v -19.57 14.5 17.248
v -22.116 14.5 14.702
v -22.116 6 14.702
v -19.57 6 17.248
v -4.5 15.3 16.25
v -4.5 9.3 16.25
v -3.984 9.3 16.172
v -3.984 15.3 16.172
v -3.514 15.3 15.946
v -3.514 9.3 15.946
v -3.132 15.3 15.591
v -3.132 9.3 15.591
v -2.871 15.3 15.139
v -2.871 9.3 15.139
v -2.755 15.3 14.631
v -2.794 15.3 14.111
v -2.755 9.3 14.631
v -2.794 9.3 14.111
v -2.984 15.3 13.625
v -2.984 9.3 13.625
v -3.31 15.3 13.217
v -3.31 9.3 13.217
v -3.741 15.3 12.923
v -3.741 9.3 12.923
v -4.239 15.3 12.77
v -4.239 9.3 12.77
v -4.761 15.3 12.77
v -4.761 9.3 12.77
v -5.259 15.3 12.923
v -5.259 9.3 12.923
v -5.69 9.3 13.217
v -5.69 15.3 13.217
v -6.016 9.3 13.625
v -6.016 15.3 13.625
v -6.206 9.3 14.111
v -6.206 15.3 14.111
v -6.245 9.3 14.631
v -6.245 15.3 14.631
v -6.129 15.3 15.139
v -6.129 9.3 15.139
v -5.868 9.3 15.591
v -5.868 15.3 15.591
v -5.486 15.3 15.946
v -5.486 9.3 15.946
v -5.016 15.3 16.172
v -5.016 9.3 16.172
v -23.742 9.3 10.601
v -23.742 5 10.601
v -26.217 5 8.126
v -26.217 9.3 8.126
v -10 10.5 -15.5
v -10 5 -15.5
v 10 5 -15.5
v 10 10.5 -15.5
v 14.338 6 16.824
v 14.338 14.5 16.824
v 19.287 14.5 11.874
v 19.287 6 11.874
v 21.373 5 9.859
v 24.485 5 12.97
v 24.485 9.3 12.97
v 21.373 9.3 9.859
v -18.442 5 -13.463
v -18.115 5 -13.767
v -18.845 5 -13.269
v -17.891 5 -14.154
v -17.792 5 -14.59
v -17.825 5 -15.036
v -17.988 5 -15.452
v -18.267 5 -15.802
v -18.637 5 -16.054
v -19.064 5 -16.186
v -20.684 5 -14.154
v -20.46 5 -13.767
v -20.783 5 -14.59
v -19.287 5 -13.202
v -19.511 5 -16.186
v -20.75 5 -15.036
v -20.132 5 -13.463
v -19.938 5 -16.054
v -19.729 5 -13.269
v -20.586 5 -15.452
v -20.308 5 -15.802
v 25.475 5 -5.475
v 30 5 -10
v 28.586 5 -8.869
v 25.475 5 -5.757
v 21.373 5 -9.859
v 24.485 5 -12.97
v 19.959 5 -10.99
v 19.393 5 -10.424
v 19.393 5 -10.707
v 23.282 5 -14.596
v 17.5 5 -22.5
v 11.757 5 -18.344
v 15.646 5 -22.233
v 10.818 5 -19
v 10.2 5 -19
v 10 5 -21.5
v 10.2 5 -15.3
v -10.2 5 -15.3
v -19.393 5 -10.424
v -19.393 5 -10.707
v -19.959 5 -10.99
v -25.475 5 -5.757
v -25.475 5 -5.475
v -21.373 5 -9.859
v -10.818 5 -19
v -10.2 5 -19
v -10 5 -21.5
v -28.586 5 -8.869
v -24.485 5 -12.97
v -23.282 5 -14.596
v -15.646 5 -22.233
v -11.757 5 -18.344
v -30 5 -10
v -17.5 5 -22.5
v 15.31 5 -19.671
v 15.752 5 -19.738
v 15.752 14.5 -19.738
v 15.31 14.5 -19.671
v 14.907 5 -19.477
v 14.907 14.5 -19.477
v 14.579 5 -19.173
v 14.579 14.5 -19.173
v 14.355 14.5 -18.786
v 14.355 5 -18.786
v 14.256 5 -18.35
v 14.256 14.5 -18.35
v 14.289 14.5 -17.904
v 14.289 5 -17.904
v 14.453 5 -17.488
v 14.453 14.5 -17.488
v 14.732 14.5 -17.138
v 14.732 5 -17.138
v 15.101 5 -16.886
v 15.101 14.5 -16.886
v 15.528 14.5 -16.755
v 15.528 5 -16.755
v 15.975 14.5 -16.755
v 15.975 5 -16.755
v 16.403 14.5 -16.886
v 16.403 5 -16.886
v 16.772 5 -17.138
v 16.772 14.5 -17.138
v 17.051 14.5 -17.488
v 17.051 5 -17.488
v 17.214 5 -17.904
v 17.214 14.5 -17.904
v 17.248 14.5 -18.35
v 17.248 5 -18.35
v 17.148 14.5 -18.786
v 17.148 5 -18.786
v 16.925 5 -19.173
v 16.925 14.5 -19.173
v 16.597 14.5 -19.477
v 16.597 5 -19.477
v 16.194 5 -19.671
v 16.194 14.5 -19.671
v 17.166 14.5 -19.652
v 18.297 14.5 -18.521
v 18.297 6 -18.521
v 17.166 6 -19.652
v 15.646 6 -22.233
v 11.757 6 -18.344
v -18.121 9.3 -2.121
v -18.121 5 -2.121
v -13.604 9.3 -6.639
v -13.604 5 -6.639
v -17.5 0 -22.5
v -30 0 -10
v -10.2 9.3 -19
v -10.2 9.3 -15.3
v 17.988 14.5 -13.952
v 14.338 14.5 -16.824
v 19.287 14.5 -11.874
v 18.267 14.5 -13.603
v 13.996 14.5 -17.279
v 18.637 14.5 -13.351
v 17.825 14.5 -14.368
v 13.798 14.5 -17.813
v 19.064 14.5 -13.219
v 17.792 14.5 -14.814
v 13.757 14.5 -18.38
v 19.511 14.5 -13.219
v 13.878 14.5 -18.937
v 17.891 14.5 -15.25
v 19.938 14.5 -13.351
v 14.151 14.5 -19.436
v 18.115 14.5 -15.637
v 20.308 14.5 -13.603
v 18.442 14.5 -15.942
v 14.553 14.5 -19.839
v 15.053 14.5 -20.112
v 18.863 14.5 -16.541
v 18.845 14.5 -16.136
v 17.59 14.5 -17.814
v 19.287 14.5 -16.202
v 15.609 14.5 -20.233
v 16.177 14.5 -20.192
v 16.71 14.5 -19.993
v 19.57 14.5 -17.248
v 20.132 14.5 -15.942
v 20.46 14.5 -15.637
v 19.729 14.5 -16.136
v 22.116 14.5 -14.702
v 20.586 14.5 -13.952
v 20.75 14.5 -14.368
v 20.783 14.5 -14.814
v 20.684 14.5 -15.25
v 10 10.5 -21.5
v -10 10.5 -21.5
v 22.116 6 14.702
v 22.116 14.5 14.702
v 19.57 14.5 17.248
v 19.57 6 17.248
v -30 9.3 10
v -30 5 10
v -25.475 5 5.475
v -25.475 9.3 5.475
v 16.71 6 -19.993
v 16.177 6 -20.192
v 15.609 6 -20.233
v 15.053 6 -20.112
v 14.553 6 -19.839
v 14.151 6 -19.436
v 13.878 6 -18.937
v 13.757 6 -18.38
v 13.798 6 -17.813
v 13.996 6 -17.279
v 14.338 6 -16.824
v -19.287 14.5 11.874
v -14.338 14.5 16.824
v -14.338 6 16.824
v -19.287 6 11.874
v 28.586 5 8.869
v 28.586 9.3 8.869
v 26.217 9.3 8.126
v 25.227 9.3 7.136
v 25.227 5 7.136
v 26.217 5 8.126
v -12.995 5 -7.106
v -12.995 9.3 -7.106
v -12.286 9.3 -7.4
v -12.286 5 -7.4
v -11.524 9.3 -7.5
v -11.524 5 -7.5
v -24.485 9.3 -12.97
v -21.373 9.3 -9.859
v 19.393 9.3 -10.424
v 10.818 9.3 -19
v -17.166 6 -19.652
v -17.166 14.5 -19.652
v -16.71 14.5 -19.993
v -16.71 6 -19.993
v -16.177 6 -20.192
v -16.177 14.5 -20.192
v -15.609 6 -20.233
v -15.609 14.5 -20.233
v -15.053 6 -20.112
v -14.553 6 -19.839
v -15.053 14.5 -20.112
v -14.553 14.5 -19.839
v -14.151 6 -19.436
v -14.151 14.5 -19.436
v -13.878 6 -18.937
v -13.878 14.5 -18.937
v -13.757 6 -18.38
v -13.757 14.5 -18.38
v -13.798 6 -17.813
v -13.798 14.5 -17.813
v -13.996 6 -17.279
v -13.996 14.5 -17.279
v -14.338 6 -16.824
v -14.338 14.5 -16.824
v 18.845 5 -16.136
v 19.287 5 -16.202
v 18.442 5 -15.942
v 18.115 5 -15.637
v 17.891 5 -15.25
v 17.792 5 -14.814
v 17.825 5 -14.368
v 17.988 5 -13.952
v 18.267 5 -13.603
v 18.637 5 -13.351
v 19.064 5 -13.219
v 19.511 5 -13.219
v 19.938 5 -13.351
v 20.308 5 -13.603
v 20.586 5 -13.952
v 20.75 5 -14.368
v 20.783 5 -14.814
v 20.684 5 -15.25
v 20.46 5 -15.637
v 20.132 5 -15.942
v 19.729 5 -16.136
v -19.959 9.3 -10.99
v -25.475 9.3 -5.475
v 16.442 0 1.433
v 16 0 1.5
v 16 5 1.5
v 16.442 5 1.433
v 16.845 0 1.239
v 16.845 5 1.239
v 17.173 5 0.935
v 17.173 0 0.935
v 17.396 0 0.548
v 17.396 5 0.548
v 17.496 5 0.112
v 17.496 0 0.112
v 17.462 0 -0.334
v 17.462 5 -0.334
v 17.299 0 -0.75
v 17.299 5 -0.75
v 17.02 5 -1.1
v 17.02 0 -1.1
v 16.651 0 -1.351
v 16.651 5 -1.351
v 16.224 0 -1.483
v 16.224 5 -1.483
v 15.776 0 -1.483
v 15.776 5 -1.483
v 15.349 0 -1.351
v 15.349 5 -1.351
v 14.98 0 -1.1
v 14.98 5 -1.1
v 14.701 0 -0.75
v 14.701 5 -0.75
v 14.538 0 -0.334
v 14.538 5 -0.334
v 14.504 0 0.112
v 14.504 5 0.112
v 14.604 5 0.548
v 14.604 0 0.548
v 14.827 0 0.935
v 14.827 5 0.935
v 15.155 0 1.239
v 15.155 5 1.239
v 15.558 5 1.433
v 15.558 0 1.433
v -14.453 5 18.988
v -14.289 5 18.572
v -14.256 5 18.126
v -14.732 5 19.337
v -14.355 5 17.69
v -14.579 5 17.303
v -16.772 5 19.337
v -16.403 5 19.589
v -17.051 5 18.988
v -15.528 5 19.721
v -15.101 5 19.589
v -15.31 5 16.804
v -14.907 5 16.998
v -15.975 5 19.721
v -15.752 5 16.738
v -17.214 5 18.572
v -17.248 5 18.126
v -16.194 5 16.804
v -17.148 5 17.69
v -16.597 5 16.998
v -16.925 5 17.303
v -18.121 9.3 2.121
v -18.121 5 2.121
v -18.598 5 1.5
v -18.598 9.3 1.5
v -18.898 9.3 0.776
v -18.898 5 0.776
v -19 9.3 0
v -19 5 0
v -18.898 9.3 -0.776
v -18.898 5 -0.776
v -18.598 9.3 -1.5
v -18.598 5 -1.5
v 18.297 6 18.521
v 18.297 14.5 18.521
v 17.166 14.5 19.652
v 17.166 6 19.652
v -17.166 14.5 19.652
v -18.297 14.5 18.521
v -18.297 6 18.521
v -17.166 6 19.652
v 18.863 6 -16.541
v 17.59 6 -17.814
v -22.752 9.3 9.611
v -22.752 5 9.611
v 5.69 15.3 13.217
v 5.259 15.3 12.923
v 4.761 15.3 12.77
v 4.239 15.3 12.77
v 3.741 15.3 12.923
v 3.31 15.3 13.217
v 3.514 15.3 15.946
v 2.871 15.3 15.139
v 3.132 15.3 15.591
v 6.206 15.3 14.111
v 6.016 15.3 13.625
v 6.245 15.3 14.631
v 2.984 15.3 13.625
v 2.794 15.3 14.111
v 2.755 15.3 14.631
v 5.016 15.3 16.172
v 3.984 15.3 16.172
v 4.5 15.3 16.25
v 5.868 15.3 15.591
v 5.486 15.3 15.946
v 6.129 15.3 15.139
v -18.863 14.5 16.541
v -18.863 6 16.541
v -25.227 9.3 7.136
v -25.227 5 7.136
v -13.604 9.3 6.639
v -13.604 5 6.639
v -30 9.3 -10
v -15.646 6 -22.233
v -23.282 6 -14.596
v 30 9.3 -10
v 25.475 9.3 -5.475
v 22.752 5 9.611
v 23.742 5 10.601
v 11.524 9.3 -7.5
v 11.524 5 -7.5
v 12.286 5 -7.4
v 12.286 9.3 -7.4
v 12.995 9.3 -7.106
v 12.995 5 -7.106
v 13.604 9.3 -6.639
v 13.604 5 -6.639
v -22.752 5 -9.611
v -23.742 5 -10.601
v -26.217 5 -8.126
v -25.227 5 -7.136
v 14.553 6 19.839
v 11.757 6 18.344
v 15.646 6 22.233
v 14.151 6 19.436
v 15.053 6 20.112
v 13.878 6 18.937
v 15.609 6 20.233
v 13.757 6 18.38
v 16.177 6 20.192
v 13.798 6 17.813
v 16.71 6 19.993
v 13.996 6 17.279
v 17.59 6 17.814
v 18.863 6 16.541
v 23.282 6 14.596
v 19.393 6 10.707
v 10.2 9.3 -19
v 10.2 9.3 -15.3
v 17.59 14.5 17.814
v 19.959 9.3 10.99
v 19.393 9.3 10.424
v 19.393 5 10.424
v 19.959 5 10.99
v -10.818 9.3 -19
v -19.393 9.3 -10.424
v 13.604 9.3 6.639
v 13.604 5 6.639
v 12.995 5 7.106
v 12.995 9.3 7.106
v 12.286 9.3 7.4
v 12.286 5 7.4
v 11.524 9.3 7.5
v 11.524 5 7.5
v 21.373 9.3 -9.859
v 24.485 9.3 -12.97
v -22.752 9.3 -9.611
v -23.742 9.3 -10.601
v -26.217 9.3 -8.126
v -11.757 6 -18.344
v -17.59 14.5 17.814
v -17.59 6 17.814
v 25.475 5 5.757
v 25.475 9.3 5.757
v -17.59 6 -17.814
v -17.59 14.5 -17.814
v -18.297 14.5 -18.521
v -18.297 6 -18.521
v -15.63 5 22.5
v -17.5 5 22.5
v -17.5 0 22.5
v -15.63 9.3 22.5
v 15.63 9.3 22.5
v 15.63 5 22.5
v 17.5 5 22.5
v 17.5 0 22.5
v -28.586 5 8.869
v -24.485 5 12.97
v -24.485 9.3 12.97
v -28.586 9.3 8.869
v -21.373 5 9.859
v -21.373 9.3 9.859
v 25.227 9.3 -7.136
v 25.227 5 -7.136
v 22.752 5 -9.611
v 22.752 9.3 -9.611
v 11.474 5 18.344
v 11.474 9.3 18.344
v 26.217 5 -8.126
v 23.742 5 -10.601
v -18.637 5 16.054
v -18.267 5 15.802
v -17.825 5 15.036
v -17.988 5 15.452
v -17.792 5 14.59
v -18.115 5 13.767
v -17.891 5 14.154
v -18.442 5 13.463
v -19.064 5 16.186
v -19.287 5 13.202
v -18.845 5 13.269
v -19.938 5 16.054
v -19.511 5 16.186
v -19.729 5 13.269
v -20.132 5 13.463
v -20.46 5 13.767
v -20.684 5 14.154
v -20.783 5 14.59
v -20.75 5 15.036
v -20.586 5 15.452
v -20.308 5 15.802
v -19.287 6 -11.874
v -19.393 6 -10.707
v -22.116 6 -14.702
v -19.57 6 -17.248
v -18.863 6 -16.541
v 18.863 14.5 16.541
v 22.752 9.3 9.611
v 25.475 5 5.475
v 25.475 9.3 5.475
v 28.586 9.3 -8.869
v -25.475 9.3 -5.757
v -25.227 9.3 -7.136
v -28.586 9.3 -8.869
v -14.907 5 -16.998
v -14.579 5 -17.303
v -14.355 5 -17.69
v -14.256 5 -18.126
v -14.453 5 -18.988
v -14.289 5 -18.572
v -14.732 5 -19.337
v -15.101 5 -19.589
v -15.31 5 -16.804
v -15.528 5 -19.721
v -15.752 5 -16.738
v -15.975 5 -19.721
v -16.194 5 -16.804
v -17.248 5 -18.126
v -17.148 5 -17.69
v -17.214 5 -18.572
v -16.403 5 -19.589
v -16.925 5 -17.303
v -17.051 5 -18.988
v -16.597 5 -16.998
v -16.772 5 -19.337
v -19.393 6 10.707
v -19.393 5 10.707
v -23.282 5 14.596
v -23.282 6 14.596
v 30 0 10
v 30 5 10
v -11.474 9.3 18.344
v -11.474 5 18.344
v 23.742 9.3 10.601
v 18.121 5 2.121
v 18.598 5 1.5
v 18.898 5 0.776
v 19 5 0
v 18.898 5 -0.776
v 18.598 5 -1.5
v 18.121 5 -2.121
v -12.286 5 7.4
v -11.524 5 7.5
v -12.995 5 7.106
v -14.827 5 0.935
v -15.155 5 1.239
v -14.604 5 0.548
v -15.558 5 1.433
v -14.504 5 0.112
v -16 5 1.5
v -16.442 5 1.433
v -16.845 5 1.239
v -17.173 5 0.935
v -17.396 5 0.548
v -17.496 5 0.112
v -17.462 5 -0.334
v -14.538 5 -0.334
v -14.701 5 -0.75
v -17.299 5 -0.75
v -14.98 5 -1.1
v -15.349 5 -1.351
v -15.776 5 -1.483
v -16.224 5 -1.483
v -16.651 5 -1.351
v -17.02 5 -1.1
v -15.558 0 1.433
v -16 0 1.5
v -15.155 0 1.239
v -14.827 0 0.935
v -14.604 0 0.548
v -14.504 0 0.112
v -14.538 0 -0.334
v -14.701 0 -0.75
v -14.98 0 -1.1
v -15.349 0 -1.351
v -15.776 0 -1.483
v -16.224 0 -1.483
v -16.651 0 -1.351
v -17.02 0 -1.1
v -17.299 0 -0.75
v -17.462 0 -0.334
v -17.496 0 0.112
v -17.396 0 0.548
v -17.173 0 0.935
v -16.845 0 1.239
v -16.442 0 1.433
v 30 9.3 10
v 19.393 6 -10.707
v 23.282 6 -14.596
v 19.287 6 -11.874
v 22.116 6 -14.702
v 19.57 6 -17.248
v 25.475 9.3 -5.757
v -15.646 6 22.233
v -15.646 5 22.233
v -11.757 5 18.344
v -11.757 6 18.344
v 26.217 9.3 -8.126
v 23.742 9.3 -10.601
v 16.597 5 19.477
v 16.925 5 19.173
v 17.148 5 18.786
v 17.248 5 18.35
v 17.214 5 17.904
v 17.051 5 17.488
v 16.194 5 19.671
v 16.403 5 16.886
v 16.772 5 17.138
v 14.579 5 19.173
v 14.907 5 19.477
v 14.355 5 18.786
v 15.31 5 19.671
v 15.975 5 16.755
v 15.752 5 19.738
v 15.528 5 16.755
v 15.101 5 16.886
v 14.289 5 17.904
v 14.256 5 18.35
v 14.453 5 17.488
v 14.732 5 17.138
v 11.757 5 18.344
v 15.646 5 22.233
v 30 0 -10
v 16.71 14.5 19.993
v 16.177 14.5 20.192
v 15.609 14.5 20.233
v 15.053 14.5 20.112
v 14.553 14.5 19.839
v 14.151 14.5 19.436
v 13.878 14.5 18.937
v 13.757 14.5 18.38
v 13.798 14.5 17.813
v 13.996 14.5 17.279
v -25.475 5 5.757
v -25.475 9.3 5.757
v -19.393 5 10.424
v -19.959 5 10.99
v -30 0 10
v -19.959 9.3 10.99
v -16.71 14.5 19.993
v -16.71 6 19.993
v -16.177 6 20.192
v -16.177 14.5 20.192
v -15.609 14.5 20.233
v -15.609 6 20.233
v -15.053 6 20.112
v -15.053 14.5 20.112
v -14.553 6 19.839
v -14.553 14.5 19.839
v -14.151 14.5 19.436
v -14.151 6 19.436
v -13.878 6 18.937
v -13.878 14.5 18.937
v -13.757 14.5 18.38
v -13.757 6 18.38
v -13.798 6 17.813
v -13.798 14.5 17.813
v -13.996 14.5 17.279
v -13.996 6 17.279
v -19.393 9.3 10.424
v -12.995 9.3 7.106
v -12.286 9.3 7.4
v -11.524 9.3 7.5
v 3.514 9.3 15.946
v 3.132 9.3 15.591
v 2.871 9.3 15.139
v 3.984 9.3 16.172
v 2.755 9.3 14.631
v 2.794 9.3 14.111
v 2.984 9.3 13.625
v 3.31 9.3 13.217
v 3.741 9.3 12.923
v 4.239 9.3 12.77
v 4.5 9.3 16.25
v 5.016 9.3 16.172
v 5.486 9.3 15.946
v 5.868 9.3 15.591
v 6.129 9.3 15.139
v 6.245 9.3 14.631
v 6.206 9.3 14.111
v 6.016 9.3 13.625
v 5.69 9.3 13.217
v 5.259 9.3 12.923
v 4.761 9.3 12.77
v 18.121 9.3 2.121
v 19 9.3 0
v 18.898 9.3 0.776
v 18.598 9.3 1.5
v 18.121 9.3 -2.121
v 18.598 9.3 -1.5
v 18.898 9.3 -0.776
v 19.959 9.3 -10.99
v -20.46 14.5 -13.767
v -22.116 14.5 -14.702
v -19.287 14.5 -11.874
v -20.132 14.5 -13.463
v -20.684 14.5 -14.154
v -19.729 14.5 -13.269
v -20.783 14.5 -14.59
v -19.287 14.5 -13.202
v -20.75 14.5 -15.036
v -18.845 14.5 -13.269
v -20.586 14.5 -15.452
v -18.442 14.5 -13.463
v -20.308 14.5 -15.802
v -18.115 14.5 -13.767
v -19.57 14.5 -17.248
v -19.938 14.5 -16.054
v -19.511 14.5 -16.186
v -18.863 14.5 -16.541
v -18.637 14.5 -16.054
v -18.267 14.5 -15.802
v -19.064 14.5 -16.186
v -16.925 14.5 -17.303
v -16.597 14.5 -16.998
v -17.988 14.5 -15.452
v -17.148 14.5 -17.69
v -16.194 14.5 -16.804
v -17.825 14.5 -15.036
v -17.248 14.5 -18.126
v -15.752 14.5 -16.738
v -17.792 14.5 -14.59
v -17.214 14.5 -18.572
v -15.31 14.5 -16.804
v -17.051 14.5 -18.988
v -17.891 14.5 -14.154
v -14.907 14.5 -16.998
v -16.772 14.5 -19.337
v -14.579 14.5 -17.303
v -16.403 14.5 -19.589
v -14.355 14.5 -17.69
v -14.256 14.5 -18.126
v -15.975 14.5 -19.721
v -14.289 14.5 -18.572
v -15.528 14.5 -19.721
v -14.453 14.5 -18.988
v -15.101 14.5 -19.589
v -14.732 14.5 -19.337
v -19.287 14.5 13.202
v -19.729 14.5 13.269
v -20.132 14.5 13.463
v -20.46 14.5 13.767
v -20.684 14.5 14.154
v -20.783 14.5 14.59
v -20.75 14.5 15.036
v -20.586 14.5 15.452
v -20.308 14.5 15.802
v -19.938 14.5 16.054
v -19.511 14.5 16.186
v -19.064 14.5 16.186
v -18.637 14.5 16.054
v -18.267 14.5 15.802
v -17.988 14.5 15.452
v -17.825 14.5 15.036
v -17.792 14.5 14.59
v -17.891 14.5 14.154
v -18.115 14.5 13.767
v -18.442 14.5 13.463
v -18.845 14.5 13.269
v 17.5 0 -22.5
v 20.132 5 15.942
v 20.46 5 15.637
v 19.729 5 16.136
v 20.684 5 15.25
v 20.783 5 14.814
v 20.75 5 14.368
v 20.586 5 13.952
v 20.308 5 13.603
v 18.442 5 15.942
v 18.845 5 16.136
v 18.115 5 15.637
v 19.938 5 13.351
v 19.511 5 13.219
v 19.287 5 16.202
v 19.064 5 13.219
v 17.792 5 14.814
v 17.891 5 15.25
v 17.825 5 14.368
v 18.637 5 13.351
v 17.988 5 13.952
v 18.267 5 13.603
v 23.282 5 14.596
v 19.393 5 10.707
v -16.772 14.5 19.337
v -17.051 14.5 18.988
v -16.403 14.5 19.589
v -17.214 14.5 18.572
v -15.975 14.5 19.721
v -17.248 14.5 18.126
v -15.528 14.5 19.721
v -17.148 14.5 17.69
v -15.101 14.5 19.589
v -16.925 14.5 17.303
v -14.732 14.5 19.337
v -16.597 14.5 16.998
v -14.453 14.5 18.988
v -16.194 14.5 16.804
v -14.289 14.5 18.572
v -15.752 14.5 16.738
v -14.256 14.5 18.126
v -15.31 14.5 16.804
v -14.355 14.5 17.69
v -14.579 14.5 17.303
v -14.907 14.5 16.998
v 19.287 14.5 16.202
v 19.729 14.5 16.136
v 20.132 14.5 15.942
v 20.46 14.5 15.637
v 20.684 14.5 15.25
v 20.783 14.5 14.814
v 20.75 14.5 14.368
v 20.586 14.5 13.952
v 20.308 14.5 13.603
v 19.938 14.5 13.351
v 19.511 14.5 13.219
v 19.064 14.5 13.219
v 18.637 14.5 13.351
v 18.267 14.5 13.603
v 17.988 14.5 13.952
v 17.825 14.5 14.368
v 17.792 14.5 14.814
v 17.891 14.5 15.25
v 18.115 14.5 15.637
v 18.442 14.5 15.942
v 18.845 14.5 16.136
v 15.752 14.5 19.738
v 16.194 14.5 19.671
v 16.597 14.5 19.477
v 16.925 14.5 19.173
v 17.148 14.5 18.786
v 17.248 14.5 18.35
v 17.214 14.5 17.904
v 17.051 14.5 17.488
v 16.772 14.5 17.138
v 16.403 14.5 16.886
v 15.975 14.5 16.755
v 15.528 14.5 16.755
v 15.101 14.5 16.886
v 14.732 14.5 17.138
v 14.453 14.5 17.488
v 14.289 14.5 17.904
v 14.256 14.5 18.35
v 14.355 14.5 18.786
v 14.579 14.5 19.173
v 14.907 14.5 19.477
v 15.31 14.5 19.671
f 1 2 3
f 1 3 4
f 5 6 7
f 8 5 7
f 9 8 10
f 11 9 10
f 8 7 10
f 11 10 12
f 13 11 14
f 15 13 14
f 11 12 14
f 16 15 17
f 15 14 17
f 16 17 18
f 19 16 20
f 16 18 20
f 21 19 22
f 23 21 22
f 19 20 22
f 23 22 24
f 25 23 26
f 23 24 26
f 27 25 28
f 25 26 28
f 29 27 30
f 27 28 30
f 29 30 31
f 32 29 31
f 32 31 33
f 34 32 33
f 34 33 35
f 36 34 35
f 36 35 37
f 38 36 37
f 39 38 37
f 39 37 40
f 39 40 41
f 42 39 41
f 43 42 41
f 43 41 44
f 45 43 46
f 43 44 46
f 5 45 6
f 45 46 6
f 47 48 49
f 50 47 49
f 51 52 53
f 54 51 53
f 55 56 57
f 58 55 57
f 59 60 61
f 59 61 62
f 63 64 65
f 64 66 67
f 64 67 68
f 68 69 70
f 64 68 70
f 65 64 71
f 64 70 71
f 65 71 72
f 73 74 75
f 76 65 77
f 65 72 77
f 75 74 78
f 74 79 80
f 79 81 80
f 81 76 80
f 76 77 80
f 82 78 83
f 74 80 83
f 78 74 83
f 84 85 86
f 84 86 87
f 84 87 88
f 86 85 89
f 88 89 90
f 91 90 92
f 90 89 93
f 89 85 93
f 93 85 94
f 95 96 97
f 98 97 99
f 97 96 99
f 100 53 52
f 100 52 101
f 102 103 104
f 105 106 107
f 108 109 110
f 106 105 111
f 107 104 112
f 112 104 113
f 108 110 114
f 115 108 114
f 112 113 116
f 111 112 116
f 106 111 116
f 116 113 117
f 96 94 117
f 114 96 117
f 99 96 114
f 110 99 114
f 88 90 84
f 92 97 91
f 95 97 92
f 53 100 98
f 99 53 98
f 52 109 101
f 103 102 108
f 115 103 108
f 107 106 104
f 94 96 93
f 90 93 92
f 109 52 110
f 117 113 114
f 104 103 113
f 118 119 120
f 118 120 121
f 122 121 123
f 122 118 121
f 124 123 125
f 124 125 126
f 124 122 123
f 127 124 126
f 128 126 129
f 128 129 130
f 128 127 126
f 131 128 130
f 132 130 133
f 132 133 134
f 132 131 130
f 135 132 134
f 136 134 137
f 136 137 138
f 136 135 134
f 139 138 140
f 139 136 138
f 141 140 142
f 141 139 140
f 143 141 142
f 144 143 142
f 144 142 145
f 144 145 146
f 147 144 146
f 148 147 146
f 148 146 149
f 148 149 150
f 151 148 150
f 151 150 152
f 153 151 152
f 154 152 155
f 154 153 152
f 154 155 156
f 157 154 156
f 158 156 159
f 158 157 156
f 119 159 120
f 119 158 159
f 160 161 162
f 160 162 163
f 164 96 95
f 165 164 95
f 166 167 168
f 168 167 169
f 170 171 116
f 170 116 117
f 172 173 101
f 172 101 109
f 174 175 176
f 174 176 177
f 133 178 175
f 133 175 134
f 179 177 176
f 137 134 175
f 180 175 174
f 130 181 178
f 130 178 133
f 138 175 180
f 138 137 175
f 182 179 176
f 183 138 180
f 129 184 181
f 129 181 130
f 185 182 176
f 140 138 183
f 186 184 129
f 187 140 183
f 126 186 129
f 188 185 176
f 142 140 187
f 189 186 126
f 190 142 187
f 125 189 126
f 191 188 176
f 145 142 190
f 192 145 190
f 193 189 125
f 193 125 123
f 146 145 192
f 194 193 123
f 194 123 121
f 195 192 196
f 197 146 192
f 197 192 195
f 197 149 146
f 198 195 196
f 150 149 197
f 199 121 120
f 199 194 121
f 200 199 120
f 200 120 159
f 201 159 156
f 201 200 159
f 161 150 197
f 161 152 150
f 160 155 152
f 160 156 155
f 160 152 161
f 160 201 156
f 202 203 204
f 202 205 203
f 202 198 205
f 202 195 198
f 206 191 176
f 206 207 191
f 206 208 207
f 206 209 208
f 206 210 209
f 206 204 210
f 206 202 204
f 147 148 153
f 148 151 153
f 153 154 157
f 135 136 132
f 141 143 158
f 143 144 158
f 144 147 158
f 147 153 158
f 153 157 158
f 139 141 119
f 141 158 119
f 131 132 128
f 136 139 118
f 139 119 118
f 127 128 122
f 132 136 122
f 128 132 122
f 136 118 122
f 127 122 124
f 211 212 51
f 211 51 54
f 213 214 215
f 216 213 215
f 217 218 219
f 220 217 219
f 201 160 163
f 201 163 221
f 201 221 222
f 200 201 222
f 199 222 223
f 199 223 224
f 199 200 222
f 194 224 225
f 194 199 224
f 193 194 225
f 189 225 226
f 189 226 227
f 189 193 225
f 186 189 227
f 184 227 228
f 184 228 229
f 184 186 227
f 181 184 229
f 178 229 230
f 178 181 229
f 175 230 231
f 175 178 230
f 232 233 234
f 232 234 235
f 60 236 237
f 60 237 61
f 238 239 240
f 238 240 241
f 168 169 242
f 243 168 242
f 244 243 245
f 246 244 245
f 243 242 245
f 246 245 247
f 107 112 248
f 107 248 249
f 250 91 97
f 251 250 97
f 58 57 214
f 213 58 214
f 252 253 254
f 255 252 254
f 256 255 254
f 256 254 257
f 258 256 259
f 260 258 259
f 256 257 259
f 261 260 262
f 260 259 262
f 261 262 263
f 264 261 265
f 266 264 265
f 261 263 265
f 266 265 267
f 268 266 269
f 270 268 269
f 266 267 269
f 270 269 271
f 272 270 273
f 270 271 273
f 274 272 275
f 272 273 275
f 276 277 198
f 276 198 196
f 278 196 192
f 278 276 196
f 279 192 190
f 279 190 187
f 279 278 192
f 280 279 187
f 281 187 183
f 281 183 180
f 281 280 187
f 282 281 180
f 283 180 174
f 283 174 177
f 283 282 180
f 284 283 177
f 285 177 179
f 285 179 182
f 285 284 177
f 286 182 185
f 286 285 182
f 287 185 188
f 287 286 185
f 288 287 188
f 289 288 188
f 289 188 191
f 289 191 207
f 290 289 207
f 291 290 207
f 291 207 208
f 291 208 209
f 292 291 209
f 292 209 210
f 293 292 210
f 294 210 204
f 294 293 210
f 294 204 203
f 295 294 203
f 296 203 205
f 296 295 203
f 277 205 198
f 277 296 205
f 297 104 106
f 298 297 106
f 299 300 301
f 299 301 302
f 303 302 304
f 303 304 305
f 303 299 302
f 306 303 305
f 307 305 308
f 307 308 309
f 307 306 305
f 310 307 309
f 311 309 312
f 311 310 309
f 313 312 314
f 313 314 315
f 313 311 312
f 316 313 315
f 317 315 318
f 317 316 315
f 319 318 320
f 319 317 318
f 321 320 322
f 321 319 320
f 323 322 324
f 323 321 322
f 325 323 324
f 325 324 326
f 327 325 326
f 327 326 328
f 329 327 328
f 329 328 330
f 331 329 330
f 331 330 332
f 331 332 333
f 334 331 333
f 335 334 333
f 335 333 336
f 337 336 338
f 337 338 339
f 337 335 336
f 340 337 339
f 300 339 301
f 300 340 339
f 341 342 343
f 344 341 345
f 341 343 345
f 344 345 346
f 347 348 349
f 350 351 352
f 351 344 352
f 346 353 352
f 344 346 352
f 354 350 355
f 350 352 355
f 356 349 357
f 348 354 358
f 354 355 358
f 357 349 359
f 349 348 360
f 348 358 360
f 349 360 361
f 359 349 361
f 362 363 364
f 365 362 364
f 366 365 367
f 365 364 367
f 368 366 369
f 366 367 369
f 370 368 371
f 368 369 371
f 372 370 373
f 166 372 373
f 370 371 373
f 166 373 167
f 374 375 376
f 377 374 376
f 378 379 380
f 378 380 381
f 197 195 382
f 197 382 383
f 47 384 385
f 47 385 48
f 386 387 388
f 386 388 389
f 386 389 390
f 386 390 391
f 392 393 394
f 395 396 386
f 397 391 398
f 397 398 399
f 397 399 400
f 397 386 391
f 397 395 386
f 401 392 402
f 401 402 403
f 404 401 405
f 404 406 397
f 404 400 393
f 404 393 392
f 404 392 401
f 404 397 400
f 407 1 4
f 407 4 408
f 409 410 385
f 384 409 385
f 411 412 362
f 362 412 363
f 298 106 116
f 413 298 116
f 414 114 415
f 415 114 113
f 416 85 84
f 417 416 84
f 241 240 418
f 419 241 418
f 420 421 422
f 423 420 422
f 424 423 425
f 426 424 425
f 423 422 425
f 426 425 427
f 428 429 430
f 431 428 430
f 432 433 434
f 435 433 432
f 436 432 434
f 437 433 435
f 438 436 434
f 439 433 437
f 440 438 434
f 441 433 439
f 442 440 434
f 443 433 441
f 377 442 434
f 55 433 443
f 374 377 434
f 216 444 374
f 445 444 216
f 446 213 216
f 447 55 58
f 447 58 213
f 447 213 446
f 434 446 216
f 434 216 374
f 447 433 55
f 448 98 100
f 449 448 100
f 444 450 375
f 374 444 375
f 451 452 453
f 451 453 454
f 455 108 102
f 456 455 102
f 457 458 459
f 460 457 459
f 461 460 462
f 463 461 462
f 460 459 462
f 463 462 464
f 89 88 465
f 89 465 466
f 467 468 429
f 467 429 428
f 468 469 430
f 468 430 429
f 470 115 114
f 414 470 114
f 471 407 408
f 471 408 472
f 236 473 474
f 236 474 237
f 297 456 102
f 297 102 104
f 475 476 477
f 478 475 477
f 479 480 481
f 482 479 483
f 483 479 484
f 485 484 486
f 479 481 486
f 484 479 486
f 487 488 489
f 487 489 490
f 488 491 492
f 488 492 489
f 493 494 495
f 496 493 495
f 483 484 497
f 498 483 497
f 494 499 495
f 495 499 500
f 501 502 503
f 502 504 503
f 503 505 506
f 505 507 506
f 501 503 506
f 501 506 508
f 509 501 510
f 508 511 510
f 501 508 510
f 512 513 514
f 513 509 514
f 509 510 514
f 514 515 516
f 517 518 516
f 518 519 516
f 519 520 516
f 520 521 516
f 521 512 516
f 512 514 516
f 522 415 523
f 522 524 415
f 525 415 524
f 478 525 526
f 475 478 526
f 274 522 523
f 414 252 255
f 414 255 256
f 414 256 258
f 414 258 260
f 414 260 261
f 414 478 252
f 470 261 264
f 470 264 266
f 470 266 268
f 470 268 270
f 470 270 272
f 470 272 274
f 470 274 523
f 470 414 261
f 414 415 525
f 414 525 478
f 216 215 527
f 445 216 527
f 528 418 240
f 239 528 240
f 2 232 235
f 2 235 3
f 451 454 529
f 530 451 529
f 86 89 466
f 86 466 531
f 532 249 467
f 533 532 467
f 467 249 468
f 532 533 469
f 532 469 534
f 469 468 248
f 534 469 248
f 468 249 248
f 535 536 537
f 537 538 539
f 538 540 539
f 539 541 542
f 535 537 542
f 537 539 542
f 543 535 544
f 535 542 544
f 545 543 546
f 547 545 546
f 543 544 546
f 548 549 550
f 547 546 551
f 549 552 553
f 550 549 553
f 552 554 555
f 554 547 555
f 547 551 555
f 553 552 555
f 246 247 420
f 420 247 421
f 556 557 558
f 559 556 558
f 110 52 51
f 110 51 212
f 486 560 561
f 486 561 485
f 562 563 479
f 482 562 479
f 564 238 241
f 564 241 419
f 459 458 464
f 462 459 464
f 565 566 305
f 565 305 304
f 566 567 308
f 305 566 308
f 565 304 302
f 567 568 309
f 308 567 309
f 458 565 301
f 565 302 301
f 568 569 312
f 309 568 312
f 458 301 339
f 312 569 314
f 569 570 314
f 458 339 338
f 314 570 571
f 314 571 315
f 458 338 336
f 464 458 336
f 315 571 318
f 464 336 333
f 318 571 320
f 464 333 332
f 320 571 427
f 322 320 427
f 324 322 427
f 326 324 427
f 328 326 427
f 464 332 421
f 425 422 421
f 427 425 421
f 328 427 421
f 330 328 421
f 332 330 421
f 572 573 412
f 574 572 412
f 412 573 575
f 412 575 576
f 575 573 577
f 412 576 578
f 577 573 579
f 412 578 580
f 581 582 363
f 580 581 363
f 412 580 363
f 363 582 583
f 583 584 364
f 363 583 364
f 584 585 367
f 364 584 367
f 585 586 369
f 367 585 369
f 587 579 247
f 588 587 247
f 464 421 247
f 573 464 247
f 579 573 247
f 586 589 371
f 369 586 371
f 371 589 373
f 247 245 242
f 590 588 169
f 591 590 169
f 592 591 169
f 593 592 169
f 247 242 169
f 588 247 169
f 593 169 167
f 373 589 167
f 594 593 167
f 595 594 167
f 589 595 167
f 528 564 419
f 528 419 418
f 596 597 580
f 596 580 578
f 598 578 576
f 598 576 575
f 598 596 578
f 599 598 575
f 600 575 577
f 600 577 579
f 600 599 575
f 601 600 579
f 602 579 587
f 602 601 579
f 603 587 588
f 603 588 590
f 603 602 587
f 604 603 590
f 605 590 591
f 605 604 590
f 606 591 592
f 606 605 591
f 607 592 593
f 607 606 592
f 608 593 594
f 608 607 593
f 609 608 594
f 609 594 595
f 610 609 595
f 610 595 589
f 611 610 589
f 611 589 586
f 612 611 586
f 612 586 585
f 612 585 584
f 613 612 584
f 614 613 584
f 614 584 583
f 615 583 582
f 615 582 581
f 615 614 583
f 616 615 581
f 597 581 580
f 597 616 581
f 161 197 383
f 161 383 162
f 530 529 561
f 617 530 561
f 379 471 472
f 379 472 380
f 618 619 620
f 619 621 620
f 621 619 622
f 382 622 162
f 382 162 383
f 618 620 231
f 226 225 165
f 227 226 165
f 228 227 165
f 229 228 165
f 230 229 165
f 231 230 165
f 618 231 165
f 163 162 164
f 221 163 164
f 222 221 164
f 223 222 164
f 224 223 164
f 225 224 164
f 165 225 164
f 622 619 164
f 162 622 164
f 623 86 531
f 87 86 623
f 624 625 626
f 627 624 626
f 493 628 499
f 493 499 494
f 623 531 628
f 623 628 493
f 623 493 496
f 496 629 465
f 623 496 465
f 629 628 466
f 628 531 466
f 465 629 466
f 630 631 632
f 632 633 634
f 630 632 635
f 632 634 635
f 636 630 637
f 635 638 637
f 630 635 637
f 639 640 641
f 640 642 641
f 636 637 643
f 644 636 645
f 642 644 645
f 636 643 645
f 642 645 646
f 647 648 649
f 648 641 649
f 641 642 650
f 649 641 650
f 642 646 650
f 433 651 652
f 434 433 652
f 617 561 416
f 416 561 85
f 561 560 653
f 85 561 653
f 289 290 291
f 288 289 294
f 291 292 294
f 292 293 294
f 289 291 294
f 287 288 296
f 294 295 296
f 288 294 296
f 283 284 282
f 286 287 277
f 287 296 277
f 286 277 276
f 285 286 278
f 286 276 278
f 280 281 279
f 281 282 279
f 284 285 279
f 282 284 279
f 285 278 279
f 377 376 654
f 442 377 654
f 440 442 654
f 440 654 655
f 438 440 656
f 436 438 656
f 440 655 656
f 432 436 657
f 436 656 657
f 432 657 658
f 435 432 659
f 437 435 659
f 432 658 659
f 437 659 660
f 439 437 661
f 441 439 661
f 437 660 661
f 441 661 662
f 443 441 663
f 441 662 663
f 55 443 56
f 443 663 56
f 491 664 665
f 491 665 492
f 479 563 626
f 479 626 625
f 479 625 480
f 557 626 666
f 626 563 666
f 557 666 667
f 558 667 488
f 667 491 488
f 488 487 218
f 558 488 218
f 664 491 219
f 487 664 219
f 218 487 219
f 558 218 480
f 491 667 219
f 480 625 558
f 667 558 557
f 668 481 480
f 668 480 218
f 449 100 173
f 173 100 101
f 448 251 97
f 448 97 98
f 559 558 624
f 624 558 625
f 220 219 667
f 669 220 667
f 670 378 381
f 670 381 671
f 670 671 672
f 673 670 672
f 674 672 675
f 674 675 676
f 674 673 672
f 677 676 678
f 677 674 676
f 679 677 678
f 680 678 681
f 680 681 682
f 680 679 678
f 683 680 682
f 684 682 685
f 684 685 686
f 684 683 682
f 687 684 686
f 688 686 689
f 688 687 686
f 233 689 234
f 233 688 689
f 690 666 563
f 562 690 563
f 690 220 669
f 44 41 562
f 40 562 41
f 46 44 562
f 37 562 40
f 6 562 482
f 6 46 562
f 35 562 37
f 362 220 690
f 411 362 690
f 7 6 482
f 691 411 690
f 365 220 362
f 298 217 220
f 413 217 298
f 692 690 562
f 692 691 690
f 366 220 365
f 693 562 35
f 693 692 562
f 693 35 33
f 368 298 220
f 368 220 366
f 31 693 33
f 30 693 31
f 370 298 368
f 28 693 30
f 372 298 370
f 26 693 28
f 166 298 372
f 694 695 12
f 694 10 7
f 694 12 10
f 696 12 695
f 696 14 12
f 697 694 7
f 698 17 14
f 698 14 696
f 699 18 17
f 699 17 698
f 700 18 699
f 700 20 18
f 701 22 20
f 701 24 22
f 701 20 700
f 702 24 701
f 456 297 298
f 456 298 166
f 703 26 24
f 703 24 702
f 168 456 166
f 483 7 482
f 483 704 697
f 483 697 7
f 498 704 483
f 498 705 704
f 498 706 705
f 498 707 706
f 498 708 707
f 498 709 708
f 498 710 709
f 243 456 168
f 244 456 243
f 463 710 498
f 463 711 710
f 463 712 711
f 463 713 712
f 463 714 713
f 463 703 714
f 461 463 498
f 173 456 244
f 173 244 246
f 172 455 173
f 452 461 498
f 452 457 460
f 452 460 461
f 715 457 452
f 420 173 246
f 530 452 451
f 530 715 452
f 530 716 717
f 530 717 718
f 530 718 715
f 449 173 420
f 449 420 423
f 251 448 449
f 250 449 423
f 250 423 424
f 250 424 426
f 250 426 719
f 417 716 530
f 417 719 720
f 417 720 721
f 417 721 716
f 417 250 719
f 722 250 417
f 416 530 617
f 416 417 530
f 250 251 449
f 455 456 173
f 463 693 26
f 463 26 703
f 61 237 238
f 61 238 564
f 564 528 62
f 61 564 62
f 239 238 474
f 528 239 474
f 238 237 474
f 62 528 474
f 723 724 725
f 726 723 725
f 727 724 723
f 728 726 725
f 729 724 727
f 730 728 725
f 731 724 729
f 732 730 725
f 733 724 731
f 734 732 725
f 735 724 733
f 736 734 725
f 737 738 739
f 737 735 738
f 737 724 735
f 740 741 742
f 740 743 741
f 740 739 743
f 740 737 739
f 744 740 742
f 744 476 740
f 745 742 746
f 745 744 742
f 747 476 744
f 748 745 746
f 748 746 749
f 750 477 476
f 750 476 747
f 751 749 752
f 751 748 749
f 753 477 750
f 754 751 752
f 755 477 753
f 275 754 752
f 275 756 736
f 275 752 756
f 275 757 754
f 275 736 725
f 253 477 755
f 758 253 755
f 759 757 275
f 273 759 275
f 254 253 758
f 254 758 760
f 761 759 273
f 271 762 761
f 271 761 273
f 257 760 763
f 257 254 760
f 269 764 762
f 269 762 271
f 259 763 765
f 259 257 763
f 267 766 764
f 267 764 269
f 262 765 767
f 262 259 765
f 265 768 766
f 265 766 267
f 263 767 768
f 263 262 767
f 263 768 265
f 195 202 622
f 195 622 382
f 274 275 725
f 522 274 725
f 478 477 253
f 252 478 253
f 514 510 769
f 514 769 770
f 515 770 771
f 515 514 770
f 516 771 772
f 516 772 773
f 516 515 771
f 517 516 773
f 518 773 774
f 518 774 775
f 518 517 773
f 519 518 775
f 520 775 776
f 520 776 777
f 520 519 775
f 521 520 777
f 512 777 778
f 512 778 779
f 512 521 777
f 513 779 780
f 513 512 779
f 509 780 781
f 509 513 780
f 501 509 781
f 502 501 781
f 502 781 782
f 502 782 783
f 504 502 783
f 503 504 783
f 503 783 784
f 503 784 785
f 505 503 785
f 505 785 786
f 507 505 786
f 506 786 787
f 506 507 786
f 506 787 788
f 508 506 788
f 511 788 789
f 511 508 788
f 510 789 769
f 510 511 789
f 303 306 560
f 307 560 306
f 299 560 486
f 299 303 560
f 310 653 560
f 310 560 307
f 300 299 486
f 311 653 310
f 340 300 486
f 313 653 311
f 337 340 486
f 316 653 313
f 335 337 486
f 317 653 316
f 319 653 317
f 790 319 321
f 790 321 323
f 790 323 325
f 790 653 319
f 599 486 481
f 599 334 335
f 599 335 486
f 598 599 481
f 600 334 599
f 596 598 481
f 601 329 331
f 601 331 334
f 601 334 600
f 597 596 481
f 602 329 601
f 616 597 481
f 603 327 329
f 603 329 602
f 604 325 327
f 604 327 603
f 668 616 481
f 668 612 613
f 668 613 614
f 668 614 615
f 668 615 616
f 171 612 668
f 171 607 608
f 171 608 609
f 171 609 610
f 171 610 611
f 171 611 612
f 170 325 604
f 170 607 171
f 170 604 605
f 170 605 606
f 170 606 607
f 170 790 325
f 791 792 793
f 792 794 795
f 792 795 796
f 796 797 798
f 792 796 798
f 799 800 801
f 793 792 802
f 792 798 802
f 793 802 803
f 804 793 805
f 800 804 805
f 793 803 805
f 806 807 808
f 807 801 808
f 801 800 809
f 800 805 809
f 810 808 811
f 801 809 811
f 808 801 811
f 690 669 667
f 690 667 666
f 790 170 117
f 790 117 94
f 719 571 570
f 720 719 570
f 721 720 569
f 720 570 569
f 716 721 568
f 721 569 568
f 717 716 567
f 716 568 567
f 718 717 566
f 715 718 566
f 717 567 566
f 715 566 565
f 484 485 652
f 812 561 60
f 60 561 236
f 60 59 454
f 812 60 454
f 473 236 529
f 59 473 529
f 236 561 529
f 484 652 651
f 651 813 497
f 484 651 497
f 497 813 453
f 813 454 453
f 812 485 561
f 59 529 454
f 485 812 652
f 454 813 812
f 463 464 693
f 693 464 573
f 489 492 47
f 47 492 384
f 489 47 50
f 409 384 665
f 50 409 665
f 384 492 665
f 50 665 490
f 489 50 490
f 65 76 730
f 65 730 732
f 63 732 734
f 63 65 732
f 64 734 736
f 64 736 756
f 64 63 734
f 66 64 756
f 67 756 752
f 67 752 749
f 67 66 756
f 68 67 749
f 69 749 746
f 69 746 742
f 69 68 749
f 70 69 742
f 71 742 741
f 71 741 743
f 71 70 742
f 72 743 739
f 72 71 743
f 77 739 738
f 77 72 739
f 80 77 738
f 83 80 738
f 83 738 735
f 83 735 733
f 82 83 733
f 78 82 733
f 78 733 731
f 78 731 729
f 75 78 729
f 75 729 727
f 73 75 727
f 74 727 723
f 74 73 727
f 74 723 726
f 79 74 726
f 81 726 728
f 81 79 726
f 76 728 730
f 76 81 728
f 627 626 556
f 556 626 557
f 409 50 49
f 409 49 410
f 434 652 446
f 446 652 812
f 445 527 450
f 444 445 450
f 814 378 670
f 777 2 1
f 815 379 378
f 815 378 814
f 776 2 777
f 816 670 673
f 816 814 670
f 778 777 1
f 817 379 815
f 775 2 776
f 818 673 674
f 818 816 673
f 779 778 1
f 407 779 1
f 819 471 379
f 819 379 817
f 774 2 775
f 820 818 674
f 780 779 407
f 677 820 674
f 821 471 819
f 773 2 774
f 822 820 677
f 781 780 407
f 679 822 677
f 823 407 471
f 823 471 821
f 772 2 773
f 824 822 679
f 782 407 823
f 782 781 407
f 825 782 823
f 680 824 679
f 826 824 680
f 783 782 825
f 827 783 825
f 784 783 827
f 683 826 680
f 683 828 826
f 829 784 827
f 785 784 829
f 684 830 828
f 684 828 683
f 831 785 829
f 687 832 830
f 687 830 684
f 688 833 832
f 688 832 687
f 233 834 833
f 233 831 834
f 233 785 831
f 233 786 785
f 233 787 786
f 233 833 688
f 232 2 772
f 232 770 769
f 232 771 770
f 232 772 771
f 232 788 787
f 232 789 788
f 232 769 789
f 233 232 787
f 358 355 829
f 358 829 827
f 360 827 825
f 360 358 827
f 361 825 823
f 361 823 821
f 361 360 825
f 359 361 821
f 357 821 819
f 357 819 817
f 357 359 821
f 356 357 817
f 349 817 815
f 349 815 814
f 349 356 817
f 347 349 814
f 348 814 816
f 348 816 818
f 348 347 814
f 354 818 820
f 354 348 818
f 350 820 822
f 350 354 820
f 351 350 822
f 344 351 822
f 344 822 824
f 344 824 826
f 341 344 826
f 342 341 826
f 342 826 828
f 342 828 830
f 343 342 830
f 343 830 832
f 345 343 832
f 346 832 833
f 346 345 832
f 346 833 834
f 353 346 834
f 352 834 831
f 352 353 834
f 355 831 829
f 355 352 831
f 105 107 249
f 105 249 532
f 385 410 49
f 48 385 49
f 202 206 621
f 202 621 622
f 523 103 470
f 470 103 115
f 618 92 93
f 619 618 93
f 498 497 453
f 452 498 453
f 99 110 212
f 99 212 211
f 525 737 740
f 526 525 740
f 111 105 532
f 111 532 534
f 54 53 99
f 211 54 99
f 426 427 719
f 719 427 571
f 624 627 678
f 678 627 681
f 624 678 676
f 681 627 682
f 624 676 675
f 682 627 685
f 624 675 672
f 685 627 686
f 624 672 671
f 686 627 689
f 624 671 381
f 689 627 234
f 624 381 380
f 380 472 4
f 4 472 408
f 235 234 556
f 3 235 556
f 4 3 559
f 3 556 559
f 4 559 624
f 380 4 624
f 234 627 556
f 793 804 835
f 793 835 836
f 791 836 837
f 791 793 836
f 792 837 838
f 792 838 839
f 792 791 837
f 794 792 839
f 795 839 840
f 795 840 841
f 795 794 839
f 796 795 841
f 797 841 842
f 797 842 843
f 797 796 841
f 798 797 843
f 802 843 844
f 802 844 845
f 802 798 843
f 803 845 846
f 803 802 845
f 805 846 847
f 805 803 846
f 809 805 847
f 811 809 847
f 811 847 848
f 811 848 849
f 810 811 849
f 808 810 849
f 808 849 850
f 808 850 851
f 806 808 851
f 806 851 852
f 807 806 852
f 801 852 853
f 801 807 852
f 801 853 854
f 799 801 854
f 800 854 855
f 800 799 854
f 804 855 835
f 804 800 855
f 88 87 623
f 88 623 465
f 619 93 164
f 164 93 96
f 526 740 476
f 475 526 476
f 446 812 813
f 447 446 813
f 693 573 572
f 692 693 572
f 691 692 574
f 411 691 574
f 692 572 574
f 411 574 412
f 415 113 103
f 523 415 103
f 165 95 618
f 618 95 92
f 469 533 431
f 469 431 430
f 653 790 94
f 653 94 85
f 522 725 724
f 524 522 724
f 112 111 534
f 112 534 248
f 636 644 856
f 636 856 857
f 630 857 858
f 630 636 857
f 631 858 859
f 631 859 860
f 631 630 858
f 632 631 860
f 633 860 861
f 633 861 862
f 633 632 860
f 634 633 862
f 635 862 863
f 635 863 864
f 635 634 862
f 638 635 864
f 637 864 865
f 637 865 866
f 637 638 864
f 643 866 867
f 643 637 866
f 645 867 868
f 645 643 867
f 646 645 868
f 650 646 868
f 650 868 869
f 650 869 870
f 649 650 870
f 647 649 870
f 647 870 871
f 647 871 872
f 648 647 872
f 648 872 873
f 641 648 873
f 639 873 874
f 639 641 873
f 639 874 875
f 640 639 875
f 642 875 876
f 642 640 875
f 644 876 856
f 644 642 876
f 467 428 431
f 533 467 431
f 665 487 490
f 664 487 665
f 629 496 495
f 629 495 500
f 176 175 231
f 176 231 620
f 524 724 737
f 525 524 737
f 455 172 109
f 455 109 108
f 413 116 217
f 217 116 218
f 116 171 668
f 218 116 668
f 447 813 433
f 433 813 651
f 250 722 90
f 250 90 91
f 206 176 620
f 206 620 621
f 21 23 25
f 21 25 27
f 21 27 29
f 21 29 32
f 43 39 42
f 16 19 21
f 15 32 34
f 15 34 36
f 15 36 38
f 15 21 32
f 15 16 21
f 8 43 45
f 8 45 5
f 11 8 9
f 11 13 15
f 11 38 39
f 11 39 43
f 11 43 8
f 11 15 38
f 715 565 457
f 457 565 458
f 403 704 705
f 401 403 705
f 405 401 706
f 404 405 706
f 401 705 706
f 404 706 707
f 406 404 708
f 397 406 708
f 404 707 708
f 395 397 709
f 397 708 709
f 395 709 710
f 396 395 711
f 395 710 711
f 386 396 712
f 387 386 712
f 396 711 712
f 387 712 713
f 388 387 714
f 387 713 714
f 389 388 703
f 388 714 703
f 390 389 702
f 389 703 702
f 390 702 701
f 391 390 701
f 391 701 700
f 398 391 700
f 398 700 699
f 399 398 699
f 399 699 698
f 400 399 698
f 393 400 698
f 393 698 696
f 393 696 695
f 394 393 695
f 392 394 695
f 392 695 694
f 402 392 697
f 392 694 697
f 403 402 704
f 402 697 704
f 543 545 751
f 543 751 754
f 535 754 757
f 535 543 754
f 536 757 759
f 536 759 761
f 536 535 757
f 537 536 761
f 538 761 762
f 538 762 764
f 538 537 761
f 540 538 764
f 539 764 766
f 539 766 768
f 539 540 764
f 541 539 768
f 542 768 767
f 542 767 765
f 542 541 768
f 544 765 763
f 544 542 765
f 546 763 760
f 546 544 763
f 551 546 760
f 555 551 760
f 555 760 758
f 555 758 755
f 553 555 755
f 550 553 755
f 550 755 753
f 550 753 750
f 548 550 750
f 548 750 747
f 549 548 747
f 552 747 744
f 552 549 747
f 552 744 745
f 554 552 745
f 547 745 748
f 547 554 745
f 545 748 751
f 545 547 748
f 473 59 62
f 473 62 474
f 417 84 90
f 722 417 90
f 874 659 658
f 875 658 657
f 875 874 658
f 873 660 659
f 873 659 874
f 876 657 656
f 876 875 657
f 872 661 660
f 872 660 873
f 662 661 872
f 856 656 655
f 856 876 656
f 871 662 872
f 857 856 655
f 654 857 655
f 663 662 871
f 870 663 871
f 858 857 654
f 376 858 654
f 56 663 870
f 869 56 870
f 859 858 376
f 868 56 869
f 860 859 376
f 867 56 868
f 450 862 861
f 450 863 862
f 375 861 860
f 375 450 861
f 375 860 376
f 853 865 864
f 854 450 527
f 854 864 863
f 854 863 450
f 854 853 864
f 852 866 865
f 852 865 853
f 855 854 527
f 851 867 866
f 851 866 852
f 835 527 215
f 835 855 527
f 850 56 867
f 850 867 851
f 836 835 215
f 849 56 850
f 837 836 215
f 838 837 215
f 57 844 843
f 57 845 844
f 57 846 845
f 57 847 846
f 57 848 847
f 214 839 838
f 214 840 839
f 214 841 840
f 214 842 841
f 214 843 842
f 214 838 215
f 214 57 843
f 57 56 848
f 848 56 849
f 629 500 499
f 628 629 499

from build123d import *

# Parameters (mm, degrees)
SKETCH_1_R          = 1.5
EXTRUDE_1_DEPTH     = 5
SKETCH_2_R          = 1.5
EXTRUDE_2_DEPTH     = 9.5
CUT_EXTRUDE_1_DEPTH = 8.5
EXTRUDE_3_DEPTH     = 4.3
SKETCH_6_W          = 20
SKETCH_6_H          = 6
EXTRUDE_4_DEPTH     = 5.5
EXTRUDE_5_DEPTH     = 4.3
SKETCH_8_R          = 1.75
EXTRUDE_6_DEPTH     = 6


with BuildPart() as part:
    # 草图1 → 凸台-拉伸1 (new body)
    with BuildSketch(Plane(origin=(0, 0, 0), x_dir=(1, 0, 0), z_dir=(0, 1, 0))):
        Polygon((-30, 10), (-17.5, 22.5), (17.5, 22.5), (30, 10), (30, -10), (17.5, -22.5), (-17.5, -22.5), (-30, -10), align=None)
        with Locations(Location((-16, 0, 0), (0, 0, 270))):
            Circle(SKETCH_1_R, mode=Mode.SUBTRACT)
        with Locations(Location((16, 0, 0), (0, 0, 270))):
            Circle(SKETCH_1_R, mode=Mode.SUBTRACT)
    extrude(amount=EXTRUDE_1_DEPTH)

    # 草图2 → 凸台-拉伸2 (add)
    # profile 1 of 4: a face of its own
    with BuildSketch(Plane(origin=(0, 5, 0), x_dir=(1, 0, 0), z_dir=(0, 1, 0))):
        Polygon((-23.282485579, 14.596194078), (-19.393398282, 10.707106781), (-11.756645045, 18.343860018), (-15.645732342, 22.232947315), align=None)
        with Locations(Location((-15.751798359, 18.237794001, 0), (0, 0, 270))):
            Circle(SKETCH_2_R, mode=Mode.SUBTRACT)
        with Locations(Location((-19.287332265, 14.702260095, 0), (0, 0, 270))):
            Circle(SKETCH_2_R, mode=Mode.SUBTRACT)
    # profile 2 of 4: a face of its own
    with BuildSketch(Plane(origin=(0, 5, 0), x_dir=(1, 0, 0), z_dir=(0, 1, 0))):
        Polygon((15.645732342, 22.232947315), (11.756645045, 18.343860018), (19.393398282, 10.707106781), (23.282485579, 14.596194078), align=None)
        with Locations(Location((19.287332265, 14.702260095, 0), (0, 0, 90))):
            Circle(SKETCH_2_R, mode=Mode.SUBTRACT)
        with Locations(Location((15.751798359, 18.237794001, 0), (0, 0, 90))):
            Circle(SKETCH_2_R, mode=Mode.SUBTRACT)
    # profile 3 of 4: a face of its own
    with BuildSketch(Plane(origin=(0, 5, 0), x_dir=(1, 0, 0), z_dir=(0, 1, 0))):
        Polygon((23.282485579, -14.596194078), (19.393398282, -10.707106781), (11.756645045, -18.343860018), (15.645732342, -22.232947315), align=None)
        with Locations(Location((15.751798359, -18.237794001, 0), (0, 0, 270))):
            Circle(SKETCH_2_R, mode=Mode.SUBTRACT)
        with Locations(Location((19.287332265, -14.702260095, 0), (0, 0, 270))):
            Circle(SKETCH_2_R, mode=Mode.SUBTRACT)
    # profile 4 of 4: a face of its own
    with BuildSketch(Plane(origin=(0, 5, 0), x_dir=(1, 0, 0), z_dir=(0, 1, 0))):
        Polygon((-15.645732342, -22.232947315), (-11.756645045, -18.343860018), (-19.393398282, -10.707106781), (-23.282485579, -14.596194078), align=None)
        with Locations(Location((-19.287332265, -14.702260095, 0), (0, 0, 90))):
            Circle(SKETCH_2_R, mode=Mode.SUBTRACT)
        with Locations(Location((-15.751798359, -18.237794001, 0), (0, 0, 90))):
            Circle(SKETCH_2_R, mode=Mode.SUBTRACT)
    extrude(amount=EXTRUDE_2_DEPTH)

    # 草图3 → 切除-拉伸1 (cut)
    # profile 1 of 4: a face of its own
    with BuildSketch(Plane(origin=(0, 14.5, 0), x_dir=(1, 0, 0), z_dir=(0, 1, 0))):
        Polygon((-15.645732342, 22.232947315), (-23.282485579, 14.596194078), (-19.393398282, 10.707106781), (-11.756645045, 18.343860018), align=None)
        with BuildLine():
            Line((-14.337584797, 16.823580438), (-19.287332265, 11.87383297))
            Line((-19.287332265, 11.87383297), (-22.11575939, 14.702260095))
            Line((-22.11575939, 14.702260095), (-19.570174977, 17.247844507))
            Line((-19.570174977, 17.247844507), (-18.863068196, 16.540737726))
            Line((-18.863068196, 16.540737726), (-17.59027599, 17.813529932))
            Line((-17.59027599, 17.813529932), (-18.297382771, 18.520636713))
            Line((-18.297382771, 18.520636713), (-17.166011921, 19.652007563))
            ThreePointArc((-17.166011921, 19.652007563), (-14.337584797, 19.652007563), (-14.337584797, 16.823580438))
        make_face(mode=Mode.SUBTRACT)
    # profile 2 of 4: a face of its own
    with BuildSketch(Plane(origin=(0, 14.5, 0), x_dir=(1, 0, 0), z_dir=(0, 1, 0))):
        Polygon((11.756645045, 18.343860018), (15.645732342, 22.232947315), (23.282485579, 14.596194078), (19.393398282, 10.707106781), align=None)
        with BuildLine():
            Line((18.297382771, 18.520636713), (17.166011921, 19.652007563))
            ThreePointArc((17.166011921, 19.652007563), (14.337584797, 19.652007563), (14.337584797, 16.823580438))
            Line((14.337584797, 16.823580438), (19.287332265, 11.87383297))
            Line((19.287332265, 11.87383297), (22.11575939, 14.702260095))
            Line((22.11575939, 14.702260095), (19.570174977, 17.247844507))
            Line((19.570174977, 17.247844507), (18.863068196, 16.540737726))
            Line((18.863068196, 16.540737726), (17.59027599, 17.813529932))
            Line((17.59027599, 17.813529932), (18.297382771, 18.520636713))
        make_face(mode=Mode.SUBTRACT)
    # profile 3 of 4: a face of its own
    with BuildSketch(Plane(origin=(0, 14.5, 0), x_dir=(1, 0, 0), z_dir=(0, 1, 0))):
        Polygon((15.645732342, -22.232947315), (23.282485579, -14.596194078), (19.393398282, -10.707106781), (11.756645045, -18.343860018), align=None)
        with BuildLine():
            Line((14.337584797, -16.823580438), (19.287332265, -11.87383297))
            Line((19.287332265, -11.87383297), (22.11575939, -14.702260095))
            Line((22.11575939, -14.702260095), (19.570174977, -17.247844507))
            Line((19.570174977, -17.247844507), (18.863068196, -16.540737726))
            Line((18.863068196, -16.540737726), (17.59027599, -17.813529932))
            Line((17.59027599, -17.813529932), (18.297382771, -18.520636713))
            Line((18.297382771, -18.520636713), (17.166011921, -19.652007563))
            ThreePointArc((17.166011921, -19.652007563), (14.337584797, -19.652007563), (14.337584797, -16.823580438))
        make_face(mode=Mode.SUBTRACT)
    # profile 4 of 4: a face of its own
    with BuildSketch(Plane(origin=(0, 14.5, 0), x_dir=(1, 0, 0), z_dir=(0, 1, 0))):
        Polygon((-11.756645045, -18.343860018), (-15.645732342, -22.232947315), (-23.282485579, -14.596194078), (-19.393398282, -10.707106781), align=None)
        with BuildLine():
            Line((-18.297382771, -18.520636713), (-17.166011921, -19.652007563))
            ThreePointArc((-17.166011921, -19.652007563), (-14.337584797, -19.652007563), (-14.337584797, -16.823580438))
            Line((-14.337584797, -16.823580438), (-19.287332265, -11.87383297))
            Line((-19.287332265, -11.87383297), (-22.11575939, -14.702260095))
            Line((-22.11575939, -14.702260095), (-19.570174977, -17.247844507))
            Line((-19.570174977, -17.247844507), (-18.863068196, -16.540737726))
            Line((-18.863068196, -16.540737726), (-17.59027599, -17.813529932))
            Line((-17.59027599, -17.813529932), (-18.297382771, -18.520636713))
        make_face(mode=Mode.SUBTRACT)
    extrude(amount=-CUT_EXTRUDE_1_DEPTH, mode=Mode.SUBTRACT)

    # 草图4 → 凸台-拉伸3 (add)
    # profile 1 of 4: a face of its own
    with BuildSketch(Plane(origin=(0, 5, 0), x_dir=(1, 0, 0), z_dir=(0, 1, 0))):
        Polygon((-28.585786438, 8.86862915), (-24.484567107, 12.969848481), (-21.37329727, 9.858578644), (-25.4745166, 5.757359313), align=None)
        Polygon((-26.216978721, 8.12616703), (-23.742104986, 10.601040764), (-22.752155493, 9.61109127), (-25.227029227, 7.136217536), align=None, mode=Mode.SUBTRACT)
    # profile 2 of 4: a face of its own
    with BuildSketch(Plane(origin=(0, 5, 0), x_dir=(1, 0, 0), z_dir=(0, 1, 0))):
        Polygon((25.4745166, 5.757359313), (21.37329727, 9.858578644), (24.484567107, 12.969848481), (28.585786438, 8.86862915), align=None)
        Polygon((25.227029227, 7.136217536), (22.752155493, 9.61109127), (23.742104986, 10.601040764), (26.216978721, 8.12616703), align=None, mode=Mode.SUBTRACT)
    # profile 3 of 4: a face of its own
    with BuildSketch(Plane(origin=(0, 5, 0), x_dir=(1, 0, 0), z_dir=(0, 1, 0))):
        Polygon((28.585786438, -8.86862915), (24.484567107, -12.969848481), (21.37329727, -9.858578644), (25.4745166, -5.757359313), align=None)
        Polygon((26.216978721, -8.12616703), (23.742104986, -10.601040764), (22.752155493, -9.61109127), (25.227029227, -7.136217536), align=None, mode=Mode.SUBTRACT)
    # profile 4 of 4: a face of its own
    with BuildSketch(Plane(origin=(0, 5, 0), x_dir=(1, 0, 0), z_dir=(0, 1, 0))):
        Polygon((-25.4745166, -5.757359313), (-21.37329727, -9.858578644), (-24.484567107, -12.969848481), (-28.585786438, -8.86862915), align=None)
        Polygon((-25.227029227, -7.136217536), (-22.752155493, -9.61109127), (-23.742104986, -10.601040764), (-26.216978721, -8.12616703), align=None, mode=Mode.SUBTRACT)
    extrude(amount=EXTRUDE_3_DEPTH)

    # 草图6 → 凸台-拉伸4 (add)
    with BuildSketch(Plane(origin=(0, 5, 0), x_dir=(1, 0, 0), z_dir=(0, 1, 0))):
        with Locations((0, 18.5)):
            Rectangle(SKETCH_6_W, SKETCH_6_H)
    extrude(amount=EXTRUDE_4_DEPTH)

    # 草图5 → 凸台-拉伸5 (add)
    with BuildSketch(Plane(origin=(0, 5, 0), x_dir=(1, 0, 0), z_dir=(0, 1, 0))):
        Polygon((-30, 10), (-30, -10), (-25.4745166, -5.4745166), (-19.959083707, -10.989949494), (-19.393398282, -10.424264069), (-11.473802333, -18.343860018), (-15.629942315, -22.5), (15.629942315, -22.5), (11.473802333, -18.343860018), (19.393398282, -10.424264069), (19.959083707, -10.989949494), (25.4745166, -5.4745166), (30, -10), (30, 10), (25.4745166, 5.4745166), (19.959083707, 10.989949494), (19.393398282, 10.424264069), (10.817662351, 19), (10.2, 19), (10.2, 15.3), (-10.2, 15.3), (-10.2, 19), (-10.817662351, 19), (-19.393398282, 10.424264069), (-19.959083707, 10.989949494), (-25.4745166, 5.4745166), align=None)
        with BuildLine():
            Line((-18.121320344, 2.121320344), (-13.604055577, 6.63858511))
            ThreePointArc((-13.604055577, 6.63858511), (-12.649908859, 7.276125564), (-11.524416066, 7.5))
            Line((-11.524416066, 7.5), (11.524416066, 7.5))
            ThreePointArc((11.524416066, 7.5), (12.649908859, 7.276125564), (13.604055577, 6.63858511))
            Line((13.604055577, 6.63858511), (18.121320344, 2.121320344))
            ThreePointArc((18.121320344, 2.121320344), (19, 0), (18.121320344, -2.121320344))
            Line((18.121320344, -2.121320344), (13.604055577, -6.63858511))
            ThreePointArc((13.604055577, -6.63858511), (12.649908859, -7.276125564), (11.524416066, -7.5))
            Line((11.524416066, -7.5), (-11.524416066, -7.5))
            ThreePointArc((-11.524416066, -7.5), (-12.649908859, -7.276125564), (-13.604055577, -6.63858511))
            Line((-13.604055577, -6.63858511), (-18.121320344, -2.121320344))
            ThreePointArc((-18.121320344, -2.121320344), (-19, 0), (-18.121320344, 2.121320344))
        make_face(mode=Mode.SUBTRACT)
    extrude(amount=EXTRUDE_5_DEPTH)

    # 草图8 → 凸台-拉伸6 (add)
    with BuildSketch(Plane(origin=(0, 9.3, 0), x_dir=(1, 0, 0), z_dir=(0, 1, 0))):
        with Locations(Location((-4.5, -14.5, 0), (0, 0, 270))):
            Circle(SKETCH_8_R)
        with Locations(Location((4.5, -14.5, 0), (0, 0, 270))):
            Circle(SKETCH_8_R)
    extrude(amount=EXTRUDE_6_DEPTH)


solid = part.part
